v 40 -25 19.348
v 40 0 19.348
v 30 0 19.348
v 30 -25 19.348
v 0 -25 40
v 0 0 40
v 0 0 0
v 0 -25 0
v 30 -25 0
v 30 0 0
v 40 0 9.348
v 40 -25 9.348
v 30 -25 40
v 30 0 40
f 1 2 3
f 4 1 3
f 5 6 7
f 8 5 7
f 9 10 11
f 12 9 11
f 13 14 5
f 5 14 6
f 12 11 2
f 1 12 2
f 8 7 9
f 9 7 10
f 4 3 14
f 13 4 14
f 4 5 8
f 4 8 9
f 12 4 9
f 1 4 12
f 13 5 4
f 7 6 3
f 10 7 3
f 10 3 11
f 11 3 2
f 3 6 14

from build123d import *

# Parameters (mm, degrees)
F0_W     = 20
F0_H     = 21
F0_H_2   = 9
F1_DEPTH = 25


with BuildPart() as f1:
    # F0 (on Front) → F1 (new body)
    with BuildSketch(Plane.XZ):
        with Locations((10, 19.5)):
            Rectangle(F0_W, F0_H)
        Polygon((20, 9), (20, 0), (30, 0), (40, 9.348061), (40, 19.348061), (30, 19.348061), (30, 40), (0, 40), (0, 30), (20, 30), align=None)
        with Locations((10, 4.5)):
            Rectangle(F0_W, F0_H_2)
    extrude(amount=F1_DEPTH)


solid = f1.part
